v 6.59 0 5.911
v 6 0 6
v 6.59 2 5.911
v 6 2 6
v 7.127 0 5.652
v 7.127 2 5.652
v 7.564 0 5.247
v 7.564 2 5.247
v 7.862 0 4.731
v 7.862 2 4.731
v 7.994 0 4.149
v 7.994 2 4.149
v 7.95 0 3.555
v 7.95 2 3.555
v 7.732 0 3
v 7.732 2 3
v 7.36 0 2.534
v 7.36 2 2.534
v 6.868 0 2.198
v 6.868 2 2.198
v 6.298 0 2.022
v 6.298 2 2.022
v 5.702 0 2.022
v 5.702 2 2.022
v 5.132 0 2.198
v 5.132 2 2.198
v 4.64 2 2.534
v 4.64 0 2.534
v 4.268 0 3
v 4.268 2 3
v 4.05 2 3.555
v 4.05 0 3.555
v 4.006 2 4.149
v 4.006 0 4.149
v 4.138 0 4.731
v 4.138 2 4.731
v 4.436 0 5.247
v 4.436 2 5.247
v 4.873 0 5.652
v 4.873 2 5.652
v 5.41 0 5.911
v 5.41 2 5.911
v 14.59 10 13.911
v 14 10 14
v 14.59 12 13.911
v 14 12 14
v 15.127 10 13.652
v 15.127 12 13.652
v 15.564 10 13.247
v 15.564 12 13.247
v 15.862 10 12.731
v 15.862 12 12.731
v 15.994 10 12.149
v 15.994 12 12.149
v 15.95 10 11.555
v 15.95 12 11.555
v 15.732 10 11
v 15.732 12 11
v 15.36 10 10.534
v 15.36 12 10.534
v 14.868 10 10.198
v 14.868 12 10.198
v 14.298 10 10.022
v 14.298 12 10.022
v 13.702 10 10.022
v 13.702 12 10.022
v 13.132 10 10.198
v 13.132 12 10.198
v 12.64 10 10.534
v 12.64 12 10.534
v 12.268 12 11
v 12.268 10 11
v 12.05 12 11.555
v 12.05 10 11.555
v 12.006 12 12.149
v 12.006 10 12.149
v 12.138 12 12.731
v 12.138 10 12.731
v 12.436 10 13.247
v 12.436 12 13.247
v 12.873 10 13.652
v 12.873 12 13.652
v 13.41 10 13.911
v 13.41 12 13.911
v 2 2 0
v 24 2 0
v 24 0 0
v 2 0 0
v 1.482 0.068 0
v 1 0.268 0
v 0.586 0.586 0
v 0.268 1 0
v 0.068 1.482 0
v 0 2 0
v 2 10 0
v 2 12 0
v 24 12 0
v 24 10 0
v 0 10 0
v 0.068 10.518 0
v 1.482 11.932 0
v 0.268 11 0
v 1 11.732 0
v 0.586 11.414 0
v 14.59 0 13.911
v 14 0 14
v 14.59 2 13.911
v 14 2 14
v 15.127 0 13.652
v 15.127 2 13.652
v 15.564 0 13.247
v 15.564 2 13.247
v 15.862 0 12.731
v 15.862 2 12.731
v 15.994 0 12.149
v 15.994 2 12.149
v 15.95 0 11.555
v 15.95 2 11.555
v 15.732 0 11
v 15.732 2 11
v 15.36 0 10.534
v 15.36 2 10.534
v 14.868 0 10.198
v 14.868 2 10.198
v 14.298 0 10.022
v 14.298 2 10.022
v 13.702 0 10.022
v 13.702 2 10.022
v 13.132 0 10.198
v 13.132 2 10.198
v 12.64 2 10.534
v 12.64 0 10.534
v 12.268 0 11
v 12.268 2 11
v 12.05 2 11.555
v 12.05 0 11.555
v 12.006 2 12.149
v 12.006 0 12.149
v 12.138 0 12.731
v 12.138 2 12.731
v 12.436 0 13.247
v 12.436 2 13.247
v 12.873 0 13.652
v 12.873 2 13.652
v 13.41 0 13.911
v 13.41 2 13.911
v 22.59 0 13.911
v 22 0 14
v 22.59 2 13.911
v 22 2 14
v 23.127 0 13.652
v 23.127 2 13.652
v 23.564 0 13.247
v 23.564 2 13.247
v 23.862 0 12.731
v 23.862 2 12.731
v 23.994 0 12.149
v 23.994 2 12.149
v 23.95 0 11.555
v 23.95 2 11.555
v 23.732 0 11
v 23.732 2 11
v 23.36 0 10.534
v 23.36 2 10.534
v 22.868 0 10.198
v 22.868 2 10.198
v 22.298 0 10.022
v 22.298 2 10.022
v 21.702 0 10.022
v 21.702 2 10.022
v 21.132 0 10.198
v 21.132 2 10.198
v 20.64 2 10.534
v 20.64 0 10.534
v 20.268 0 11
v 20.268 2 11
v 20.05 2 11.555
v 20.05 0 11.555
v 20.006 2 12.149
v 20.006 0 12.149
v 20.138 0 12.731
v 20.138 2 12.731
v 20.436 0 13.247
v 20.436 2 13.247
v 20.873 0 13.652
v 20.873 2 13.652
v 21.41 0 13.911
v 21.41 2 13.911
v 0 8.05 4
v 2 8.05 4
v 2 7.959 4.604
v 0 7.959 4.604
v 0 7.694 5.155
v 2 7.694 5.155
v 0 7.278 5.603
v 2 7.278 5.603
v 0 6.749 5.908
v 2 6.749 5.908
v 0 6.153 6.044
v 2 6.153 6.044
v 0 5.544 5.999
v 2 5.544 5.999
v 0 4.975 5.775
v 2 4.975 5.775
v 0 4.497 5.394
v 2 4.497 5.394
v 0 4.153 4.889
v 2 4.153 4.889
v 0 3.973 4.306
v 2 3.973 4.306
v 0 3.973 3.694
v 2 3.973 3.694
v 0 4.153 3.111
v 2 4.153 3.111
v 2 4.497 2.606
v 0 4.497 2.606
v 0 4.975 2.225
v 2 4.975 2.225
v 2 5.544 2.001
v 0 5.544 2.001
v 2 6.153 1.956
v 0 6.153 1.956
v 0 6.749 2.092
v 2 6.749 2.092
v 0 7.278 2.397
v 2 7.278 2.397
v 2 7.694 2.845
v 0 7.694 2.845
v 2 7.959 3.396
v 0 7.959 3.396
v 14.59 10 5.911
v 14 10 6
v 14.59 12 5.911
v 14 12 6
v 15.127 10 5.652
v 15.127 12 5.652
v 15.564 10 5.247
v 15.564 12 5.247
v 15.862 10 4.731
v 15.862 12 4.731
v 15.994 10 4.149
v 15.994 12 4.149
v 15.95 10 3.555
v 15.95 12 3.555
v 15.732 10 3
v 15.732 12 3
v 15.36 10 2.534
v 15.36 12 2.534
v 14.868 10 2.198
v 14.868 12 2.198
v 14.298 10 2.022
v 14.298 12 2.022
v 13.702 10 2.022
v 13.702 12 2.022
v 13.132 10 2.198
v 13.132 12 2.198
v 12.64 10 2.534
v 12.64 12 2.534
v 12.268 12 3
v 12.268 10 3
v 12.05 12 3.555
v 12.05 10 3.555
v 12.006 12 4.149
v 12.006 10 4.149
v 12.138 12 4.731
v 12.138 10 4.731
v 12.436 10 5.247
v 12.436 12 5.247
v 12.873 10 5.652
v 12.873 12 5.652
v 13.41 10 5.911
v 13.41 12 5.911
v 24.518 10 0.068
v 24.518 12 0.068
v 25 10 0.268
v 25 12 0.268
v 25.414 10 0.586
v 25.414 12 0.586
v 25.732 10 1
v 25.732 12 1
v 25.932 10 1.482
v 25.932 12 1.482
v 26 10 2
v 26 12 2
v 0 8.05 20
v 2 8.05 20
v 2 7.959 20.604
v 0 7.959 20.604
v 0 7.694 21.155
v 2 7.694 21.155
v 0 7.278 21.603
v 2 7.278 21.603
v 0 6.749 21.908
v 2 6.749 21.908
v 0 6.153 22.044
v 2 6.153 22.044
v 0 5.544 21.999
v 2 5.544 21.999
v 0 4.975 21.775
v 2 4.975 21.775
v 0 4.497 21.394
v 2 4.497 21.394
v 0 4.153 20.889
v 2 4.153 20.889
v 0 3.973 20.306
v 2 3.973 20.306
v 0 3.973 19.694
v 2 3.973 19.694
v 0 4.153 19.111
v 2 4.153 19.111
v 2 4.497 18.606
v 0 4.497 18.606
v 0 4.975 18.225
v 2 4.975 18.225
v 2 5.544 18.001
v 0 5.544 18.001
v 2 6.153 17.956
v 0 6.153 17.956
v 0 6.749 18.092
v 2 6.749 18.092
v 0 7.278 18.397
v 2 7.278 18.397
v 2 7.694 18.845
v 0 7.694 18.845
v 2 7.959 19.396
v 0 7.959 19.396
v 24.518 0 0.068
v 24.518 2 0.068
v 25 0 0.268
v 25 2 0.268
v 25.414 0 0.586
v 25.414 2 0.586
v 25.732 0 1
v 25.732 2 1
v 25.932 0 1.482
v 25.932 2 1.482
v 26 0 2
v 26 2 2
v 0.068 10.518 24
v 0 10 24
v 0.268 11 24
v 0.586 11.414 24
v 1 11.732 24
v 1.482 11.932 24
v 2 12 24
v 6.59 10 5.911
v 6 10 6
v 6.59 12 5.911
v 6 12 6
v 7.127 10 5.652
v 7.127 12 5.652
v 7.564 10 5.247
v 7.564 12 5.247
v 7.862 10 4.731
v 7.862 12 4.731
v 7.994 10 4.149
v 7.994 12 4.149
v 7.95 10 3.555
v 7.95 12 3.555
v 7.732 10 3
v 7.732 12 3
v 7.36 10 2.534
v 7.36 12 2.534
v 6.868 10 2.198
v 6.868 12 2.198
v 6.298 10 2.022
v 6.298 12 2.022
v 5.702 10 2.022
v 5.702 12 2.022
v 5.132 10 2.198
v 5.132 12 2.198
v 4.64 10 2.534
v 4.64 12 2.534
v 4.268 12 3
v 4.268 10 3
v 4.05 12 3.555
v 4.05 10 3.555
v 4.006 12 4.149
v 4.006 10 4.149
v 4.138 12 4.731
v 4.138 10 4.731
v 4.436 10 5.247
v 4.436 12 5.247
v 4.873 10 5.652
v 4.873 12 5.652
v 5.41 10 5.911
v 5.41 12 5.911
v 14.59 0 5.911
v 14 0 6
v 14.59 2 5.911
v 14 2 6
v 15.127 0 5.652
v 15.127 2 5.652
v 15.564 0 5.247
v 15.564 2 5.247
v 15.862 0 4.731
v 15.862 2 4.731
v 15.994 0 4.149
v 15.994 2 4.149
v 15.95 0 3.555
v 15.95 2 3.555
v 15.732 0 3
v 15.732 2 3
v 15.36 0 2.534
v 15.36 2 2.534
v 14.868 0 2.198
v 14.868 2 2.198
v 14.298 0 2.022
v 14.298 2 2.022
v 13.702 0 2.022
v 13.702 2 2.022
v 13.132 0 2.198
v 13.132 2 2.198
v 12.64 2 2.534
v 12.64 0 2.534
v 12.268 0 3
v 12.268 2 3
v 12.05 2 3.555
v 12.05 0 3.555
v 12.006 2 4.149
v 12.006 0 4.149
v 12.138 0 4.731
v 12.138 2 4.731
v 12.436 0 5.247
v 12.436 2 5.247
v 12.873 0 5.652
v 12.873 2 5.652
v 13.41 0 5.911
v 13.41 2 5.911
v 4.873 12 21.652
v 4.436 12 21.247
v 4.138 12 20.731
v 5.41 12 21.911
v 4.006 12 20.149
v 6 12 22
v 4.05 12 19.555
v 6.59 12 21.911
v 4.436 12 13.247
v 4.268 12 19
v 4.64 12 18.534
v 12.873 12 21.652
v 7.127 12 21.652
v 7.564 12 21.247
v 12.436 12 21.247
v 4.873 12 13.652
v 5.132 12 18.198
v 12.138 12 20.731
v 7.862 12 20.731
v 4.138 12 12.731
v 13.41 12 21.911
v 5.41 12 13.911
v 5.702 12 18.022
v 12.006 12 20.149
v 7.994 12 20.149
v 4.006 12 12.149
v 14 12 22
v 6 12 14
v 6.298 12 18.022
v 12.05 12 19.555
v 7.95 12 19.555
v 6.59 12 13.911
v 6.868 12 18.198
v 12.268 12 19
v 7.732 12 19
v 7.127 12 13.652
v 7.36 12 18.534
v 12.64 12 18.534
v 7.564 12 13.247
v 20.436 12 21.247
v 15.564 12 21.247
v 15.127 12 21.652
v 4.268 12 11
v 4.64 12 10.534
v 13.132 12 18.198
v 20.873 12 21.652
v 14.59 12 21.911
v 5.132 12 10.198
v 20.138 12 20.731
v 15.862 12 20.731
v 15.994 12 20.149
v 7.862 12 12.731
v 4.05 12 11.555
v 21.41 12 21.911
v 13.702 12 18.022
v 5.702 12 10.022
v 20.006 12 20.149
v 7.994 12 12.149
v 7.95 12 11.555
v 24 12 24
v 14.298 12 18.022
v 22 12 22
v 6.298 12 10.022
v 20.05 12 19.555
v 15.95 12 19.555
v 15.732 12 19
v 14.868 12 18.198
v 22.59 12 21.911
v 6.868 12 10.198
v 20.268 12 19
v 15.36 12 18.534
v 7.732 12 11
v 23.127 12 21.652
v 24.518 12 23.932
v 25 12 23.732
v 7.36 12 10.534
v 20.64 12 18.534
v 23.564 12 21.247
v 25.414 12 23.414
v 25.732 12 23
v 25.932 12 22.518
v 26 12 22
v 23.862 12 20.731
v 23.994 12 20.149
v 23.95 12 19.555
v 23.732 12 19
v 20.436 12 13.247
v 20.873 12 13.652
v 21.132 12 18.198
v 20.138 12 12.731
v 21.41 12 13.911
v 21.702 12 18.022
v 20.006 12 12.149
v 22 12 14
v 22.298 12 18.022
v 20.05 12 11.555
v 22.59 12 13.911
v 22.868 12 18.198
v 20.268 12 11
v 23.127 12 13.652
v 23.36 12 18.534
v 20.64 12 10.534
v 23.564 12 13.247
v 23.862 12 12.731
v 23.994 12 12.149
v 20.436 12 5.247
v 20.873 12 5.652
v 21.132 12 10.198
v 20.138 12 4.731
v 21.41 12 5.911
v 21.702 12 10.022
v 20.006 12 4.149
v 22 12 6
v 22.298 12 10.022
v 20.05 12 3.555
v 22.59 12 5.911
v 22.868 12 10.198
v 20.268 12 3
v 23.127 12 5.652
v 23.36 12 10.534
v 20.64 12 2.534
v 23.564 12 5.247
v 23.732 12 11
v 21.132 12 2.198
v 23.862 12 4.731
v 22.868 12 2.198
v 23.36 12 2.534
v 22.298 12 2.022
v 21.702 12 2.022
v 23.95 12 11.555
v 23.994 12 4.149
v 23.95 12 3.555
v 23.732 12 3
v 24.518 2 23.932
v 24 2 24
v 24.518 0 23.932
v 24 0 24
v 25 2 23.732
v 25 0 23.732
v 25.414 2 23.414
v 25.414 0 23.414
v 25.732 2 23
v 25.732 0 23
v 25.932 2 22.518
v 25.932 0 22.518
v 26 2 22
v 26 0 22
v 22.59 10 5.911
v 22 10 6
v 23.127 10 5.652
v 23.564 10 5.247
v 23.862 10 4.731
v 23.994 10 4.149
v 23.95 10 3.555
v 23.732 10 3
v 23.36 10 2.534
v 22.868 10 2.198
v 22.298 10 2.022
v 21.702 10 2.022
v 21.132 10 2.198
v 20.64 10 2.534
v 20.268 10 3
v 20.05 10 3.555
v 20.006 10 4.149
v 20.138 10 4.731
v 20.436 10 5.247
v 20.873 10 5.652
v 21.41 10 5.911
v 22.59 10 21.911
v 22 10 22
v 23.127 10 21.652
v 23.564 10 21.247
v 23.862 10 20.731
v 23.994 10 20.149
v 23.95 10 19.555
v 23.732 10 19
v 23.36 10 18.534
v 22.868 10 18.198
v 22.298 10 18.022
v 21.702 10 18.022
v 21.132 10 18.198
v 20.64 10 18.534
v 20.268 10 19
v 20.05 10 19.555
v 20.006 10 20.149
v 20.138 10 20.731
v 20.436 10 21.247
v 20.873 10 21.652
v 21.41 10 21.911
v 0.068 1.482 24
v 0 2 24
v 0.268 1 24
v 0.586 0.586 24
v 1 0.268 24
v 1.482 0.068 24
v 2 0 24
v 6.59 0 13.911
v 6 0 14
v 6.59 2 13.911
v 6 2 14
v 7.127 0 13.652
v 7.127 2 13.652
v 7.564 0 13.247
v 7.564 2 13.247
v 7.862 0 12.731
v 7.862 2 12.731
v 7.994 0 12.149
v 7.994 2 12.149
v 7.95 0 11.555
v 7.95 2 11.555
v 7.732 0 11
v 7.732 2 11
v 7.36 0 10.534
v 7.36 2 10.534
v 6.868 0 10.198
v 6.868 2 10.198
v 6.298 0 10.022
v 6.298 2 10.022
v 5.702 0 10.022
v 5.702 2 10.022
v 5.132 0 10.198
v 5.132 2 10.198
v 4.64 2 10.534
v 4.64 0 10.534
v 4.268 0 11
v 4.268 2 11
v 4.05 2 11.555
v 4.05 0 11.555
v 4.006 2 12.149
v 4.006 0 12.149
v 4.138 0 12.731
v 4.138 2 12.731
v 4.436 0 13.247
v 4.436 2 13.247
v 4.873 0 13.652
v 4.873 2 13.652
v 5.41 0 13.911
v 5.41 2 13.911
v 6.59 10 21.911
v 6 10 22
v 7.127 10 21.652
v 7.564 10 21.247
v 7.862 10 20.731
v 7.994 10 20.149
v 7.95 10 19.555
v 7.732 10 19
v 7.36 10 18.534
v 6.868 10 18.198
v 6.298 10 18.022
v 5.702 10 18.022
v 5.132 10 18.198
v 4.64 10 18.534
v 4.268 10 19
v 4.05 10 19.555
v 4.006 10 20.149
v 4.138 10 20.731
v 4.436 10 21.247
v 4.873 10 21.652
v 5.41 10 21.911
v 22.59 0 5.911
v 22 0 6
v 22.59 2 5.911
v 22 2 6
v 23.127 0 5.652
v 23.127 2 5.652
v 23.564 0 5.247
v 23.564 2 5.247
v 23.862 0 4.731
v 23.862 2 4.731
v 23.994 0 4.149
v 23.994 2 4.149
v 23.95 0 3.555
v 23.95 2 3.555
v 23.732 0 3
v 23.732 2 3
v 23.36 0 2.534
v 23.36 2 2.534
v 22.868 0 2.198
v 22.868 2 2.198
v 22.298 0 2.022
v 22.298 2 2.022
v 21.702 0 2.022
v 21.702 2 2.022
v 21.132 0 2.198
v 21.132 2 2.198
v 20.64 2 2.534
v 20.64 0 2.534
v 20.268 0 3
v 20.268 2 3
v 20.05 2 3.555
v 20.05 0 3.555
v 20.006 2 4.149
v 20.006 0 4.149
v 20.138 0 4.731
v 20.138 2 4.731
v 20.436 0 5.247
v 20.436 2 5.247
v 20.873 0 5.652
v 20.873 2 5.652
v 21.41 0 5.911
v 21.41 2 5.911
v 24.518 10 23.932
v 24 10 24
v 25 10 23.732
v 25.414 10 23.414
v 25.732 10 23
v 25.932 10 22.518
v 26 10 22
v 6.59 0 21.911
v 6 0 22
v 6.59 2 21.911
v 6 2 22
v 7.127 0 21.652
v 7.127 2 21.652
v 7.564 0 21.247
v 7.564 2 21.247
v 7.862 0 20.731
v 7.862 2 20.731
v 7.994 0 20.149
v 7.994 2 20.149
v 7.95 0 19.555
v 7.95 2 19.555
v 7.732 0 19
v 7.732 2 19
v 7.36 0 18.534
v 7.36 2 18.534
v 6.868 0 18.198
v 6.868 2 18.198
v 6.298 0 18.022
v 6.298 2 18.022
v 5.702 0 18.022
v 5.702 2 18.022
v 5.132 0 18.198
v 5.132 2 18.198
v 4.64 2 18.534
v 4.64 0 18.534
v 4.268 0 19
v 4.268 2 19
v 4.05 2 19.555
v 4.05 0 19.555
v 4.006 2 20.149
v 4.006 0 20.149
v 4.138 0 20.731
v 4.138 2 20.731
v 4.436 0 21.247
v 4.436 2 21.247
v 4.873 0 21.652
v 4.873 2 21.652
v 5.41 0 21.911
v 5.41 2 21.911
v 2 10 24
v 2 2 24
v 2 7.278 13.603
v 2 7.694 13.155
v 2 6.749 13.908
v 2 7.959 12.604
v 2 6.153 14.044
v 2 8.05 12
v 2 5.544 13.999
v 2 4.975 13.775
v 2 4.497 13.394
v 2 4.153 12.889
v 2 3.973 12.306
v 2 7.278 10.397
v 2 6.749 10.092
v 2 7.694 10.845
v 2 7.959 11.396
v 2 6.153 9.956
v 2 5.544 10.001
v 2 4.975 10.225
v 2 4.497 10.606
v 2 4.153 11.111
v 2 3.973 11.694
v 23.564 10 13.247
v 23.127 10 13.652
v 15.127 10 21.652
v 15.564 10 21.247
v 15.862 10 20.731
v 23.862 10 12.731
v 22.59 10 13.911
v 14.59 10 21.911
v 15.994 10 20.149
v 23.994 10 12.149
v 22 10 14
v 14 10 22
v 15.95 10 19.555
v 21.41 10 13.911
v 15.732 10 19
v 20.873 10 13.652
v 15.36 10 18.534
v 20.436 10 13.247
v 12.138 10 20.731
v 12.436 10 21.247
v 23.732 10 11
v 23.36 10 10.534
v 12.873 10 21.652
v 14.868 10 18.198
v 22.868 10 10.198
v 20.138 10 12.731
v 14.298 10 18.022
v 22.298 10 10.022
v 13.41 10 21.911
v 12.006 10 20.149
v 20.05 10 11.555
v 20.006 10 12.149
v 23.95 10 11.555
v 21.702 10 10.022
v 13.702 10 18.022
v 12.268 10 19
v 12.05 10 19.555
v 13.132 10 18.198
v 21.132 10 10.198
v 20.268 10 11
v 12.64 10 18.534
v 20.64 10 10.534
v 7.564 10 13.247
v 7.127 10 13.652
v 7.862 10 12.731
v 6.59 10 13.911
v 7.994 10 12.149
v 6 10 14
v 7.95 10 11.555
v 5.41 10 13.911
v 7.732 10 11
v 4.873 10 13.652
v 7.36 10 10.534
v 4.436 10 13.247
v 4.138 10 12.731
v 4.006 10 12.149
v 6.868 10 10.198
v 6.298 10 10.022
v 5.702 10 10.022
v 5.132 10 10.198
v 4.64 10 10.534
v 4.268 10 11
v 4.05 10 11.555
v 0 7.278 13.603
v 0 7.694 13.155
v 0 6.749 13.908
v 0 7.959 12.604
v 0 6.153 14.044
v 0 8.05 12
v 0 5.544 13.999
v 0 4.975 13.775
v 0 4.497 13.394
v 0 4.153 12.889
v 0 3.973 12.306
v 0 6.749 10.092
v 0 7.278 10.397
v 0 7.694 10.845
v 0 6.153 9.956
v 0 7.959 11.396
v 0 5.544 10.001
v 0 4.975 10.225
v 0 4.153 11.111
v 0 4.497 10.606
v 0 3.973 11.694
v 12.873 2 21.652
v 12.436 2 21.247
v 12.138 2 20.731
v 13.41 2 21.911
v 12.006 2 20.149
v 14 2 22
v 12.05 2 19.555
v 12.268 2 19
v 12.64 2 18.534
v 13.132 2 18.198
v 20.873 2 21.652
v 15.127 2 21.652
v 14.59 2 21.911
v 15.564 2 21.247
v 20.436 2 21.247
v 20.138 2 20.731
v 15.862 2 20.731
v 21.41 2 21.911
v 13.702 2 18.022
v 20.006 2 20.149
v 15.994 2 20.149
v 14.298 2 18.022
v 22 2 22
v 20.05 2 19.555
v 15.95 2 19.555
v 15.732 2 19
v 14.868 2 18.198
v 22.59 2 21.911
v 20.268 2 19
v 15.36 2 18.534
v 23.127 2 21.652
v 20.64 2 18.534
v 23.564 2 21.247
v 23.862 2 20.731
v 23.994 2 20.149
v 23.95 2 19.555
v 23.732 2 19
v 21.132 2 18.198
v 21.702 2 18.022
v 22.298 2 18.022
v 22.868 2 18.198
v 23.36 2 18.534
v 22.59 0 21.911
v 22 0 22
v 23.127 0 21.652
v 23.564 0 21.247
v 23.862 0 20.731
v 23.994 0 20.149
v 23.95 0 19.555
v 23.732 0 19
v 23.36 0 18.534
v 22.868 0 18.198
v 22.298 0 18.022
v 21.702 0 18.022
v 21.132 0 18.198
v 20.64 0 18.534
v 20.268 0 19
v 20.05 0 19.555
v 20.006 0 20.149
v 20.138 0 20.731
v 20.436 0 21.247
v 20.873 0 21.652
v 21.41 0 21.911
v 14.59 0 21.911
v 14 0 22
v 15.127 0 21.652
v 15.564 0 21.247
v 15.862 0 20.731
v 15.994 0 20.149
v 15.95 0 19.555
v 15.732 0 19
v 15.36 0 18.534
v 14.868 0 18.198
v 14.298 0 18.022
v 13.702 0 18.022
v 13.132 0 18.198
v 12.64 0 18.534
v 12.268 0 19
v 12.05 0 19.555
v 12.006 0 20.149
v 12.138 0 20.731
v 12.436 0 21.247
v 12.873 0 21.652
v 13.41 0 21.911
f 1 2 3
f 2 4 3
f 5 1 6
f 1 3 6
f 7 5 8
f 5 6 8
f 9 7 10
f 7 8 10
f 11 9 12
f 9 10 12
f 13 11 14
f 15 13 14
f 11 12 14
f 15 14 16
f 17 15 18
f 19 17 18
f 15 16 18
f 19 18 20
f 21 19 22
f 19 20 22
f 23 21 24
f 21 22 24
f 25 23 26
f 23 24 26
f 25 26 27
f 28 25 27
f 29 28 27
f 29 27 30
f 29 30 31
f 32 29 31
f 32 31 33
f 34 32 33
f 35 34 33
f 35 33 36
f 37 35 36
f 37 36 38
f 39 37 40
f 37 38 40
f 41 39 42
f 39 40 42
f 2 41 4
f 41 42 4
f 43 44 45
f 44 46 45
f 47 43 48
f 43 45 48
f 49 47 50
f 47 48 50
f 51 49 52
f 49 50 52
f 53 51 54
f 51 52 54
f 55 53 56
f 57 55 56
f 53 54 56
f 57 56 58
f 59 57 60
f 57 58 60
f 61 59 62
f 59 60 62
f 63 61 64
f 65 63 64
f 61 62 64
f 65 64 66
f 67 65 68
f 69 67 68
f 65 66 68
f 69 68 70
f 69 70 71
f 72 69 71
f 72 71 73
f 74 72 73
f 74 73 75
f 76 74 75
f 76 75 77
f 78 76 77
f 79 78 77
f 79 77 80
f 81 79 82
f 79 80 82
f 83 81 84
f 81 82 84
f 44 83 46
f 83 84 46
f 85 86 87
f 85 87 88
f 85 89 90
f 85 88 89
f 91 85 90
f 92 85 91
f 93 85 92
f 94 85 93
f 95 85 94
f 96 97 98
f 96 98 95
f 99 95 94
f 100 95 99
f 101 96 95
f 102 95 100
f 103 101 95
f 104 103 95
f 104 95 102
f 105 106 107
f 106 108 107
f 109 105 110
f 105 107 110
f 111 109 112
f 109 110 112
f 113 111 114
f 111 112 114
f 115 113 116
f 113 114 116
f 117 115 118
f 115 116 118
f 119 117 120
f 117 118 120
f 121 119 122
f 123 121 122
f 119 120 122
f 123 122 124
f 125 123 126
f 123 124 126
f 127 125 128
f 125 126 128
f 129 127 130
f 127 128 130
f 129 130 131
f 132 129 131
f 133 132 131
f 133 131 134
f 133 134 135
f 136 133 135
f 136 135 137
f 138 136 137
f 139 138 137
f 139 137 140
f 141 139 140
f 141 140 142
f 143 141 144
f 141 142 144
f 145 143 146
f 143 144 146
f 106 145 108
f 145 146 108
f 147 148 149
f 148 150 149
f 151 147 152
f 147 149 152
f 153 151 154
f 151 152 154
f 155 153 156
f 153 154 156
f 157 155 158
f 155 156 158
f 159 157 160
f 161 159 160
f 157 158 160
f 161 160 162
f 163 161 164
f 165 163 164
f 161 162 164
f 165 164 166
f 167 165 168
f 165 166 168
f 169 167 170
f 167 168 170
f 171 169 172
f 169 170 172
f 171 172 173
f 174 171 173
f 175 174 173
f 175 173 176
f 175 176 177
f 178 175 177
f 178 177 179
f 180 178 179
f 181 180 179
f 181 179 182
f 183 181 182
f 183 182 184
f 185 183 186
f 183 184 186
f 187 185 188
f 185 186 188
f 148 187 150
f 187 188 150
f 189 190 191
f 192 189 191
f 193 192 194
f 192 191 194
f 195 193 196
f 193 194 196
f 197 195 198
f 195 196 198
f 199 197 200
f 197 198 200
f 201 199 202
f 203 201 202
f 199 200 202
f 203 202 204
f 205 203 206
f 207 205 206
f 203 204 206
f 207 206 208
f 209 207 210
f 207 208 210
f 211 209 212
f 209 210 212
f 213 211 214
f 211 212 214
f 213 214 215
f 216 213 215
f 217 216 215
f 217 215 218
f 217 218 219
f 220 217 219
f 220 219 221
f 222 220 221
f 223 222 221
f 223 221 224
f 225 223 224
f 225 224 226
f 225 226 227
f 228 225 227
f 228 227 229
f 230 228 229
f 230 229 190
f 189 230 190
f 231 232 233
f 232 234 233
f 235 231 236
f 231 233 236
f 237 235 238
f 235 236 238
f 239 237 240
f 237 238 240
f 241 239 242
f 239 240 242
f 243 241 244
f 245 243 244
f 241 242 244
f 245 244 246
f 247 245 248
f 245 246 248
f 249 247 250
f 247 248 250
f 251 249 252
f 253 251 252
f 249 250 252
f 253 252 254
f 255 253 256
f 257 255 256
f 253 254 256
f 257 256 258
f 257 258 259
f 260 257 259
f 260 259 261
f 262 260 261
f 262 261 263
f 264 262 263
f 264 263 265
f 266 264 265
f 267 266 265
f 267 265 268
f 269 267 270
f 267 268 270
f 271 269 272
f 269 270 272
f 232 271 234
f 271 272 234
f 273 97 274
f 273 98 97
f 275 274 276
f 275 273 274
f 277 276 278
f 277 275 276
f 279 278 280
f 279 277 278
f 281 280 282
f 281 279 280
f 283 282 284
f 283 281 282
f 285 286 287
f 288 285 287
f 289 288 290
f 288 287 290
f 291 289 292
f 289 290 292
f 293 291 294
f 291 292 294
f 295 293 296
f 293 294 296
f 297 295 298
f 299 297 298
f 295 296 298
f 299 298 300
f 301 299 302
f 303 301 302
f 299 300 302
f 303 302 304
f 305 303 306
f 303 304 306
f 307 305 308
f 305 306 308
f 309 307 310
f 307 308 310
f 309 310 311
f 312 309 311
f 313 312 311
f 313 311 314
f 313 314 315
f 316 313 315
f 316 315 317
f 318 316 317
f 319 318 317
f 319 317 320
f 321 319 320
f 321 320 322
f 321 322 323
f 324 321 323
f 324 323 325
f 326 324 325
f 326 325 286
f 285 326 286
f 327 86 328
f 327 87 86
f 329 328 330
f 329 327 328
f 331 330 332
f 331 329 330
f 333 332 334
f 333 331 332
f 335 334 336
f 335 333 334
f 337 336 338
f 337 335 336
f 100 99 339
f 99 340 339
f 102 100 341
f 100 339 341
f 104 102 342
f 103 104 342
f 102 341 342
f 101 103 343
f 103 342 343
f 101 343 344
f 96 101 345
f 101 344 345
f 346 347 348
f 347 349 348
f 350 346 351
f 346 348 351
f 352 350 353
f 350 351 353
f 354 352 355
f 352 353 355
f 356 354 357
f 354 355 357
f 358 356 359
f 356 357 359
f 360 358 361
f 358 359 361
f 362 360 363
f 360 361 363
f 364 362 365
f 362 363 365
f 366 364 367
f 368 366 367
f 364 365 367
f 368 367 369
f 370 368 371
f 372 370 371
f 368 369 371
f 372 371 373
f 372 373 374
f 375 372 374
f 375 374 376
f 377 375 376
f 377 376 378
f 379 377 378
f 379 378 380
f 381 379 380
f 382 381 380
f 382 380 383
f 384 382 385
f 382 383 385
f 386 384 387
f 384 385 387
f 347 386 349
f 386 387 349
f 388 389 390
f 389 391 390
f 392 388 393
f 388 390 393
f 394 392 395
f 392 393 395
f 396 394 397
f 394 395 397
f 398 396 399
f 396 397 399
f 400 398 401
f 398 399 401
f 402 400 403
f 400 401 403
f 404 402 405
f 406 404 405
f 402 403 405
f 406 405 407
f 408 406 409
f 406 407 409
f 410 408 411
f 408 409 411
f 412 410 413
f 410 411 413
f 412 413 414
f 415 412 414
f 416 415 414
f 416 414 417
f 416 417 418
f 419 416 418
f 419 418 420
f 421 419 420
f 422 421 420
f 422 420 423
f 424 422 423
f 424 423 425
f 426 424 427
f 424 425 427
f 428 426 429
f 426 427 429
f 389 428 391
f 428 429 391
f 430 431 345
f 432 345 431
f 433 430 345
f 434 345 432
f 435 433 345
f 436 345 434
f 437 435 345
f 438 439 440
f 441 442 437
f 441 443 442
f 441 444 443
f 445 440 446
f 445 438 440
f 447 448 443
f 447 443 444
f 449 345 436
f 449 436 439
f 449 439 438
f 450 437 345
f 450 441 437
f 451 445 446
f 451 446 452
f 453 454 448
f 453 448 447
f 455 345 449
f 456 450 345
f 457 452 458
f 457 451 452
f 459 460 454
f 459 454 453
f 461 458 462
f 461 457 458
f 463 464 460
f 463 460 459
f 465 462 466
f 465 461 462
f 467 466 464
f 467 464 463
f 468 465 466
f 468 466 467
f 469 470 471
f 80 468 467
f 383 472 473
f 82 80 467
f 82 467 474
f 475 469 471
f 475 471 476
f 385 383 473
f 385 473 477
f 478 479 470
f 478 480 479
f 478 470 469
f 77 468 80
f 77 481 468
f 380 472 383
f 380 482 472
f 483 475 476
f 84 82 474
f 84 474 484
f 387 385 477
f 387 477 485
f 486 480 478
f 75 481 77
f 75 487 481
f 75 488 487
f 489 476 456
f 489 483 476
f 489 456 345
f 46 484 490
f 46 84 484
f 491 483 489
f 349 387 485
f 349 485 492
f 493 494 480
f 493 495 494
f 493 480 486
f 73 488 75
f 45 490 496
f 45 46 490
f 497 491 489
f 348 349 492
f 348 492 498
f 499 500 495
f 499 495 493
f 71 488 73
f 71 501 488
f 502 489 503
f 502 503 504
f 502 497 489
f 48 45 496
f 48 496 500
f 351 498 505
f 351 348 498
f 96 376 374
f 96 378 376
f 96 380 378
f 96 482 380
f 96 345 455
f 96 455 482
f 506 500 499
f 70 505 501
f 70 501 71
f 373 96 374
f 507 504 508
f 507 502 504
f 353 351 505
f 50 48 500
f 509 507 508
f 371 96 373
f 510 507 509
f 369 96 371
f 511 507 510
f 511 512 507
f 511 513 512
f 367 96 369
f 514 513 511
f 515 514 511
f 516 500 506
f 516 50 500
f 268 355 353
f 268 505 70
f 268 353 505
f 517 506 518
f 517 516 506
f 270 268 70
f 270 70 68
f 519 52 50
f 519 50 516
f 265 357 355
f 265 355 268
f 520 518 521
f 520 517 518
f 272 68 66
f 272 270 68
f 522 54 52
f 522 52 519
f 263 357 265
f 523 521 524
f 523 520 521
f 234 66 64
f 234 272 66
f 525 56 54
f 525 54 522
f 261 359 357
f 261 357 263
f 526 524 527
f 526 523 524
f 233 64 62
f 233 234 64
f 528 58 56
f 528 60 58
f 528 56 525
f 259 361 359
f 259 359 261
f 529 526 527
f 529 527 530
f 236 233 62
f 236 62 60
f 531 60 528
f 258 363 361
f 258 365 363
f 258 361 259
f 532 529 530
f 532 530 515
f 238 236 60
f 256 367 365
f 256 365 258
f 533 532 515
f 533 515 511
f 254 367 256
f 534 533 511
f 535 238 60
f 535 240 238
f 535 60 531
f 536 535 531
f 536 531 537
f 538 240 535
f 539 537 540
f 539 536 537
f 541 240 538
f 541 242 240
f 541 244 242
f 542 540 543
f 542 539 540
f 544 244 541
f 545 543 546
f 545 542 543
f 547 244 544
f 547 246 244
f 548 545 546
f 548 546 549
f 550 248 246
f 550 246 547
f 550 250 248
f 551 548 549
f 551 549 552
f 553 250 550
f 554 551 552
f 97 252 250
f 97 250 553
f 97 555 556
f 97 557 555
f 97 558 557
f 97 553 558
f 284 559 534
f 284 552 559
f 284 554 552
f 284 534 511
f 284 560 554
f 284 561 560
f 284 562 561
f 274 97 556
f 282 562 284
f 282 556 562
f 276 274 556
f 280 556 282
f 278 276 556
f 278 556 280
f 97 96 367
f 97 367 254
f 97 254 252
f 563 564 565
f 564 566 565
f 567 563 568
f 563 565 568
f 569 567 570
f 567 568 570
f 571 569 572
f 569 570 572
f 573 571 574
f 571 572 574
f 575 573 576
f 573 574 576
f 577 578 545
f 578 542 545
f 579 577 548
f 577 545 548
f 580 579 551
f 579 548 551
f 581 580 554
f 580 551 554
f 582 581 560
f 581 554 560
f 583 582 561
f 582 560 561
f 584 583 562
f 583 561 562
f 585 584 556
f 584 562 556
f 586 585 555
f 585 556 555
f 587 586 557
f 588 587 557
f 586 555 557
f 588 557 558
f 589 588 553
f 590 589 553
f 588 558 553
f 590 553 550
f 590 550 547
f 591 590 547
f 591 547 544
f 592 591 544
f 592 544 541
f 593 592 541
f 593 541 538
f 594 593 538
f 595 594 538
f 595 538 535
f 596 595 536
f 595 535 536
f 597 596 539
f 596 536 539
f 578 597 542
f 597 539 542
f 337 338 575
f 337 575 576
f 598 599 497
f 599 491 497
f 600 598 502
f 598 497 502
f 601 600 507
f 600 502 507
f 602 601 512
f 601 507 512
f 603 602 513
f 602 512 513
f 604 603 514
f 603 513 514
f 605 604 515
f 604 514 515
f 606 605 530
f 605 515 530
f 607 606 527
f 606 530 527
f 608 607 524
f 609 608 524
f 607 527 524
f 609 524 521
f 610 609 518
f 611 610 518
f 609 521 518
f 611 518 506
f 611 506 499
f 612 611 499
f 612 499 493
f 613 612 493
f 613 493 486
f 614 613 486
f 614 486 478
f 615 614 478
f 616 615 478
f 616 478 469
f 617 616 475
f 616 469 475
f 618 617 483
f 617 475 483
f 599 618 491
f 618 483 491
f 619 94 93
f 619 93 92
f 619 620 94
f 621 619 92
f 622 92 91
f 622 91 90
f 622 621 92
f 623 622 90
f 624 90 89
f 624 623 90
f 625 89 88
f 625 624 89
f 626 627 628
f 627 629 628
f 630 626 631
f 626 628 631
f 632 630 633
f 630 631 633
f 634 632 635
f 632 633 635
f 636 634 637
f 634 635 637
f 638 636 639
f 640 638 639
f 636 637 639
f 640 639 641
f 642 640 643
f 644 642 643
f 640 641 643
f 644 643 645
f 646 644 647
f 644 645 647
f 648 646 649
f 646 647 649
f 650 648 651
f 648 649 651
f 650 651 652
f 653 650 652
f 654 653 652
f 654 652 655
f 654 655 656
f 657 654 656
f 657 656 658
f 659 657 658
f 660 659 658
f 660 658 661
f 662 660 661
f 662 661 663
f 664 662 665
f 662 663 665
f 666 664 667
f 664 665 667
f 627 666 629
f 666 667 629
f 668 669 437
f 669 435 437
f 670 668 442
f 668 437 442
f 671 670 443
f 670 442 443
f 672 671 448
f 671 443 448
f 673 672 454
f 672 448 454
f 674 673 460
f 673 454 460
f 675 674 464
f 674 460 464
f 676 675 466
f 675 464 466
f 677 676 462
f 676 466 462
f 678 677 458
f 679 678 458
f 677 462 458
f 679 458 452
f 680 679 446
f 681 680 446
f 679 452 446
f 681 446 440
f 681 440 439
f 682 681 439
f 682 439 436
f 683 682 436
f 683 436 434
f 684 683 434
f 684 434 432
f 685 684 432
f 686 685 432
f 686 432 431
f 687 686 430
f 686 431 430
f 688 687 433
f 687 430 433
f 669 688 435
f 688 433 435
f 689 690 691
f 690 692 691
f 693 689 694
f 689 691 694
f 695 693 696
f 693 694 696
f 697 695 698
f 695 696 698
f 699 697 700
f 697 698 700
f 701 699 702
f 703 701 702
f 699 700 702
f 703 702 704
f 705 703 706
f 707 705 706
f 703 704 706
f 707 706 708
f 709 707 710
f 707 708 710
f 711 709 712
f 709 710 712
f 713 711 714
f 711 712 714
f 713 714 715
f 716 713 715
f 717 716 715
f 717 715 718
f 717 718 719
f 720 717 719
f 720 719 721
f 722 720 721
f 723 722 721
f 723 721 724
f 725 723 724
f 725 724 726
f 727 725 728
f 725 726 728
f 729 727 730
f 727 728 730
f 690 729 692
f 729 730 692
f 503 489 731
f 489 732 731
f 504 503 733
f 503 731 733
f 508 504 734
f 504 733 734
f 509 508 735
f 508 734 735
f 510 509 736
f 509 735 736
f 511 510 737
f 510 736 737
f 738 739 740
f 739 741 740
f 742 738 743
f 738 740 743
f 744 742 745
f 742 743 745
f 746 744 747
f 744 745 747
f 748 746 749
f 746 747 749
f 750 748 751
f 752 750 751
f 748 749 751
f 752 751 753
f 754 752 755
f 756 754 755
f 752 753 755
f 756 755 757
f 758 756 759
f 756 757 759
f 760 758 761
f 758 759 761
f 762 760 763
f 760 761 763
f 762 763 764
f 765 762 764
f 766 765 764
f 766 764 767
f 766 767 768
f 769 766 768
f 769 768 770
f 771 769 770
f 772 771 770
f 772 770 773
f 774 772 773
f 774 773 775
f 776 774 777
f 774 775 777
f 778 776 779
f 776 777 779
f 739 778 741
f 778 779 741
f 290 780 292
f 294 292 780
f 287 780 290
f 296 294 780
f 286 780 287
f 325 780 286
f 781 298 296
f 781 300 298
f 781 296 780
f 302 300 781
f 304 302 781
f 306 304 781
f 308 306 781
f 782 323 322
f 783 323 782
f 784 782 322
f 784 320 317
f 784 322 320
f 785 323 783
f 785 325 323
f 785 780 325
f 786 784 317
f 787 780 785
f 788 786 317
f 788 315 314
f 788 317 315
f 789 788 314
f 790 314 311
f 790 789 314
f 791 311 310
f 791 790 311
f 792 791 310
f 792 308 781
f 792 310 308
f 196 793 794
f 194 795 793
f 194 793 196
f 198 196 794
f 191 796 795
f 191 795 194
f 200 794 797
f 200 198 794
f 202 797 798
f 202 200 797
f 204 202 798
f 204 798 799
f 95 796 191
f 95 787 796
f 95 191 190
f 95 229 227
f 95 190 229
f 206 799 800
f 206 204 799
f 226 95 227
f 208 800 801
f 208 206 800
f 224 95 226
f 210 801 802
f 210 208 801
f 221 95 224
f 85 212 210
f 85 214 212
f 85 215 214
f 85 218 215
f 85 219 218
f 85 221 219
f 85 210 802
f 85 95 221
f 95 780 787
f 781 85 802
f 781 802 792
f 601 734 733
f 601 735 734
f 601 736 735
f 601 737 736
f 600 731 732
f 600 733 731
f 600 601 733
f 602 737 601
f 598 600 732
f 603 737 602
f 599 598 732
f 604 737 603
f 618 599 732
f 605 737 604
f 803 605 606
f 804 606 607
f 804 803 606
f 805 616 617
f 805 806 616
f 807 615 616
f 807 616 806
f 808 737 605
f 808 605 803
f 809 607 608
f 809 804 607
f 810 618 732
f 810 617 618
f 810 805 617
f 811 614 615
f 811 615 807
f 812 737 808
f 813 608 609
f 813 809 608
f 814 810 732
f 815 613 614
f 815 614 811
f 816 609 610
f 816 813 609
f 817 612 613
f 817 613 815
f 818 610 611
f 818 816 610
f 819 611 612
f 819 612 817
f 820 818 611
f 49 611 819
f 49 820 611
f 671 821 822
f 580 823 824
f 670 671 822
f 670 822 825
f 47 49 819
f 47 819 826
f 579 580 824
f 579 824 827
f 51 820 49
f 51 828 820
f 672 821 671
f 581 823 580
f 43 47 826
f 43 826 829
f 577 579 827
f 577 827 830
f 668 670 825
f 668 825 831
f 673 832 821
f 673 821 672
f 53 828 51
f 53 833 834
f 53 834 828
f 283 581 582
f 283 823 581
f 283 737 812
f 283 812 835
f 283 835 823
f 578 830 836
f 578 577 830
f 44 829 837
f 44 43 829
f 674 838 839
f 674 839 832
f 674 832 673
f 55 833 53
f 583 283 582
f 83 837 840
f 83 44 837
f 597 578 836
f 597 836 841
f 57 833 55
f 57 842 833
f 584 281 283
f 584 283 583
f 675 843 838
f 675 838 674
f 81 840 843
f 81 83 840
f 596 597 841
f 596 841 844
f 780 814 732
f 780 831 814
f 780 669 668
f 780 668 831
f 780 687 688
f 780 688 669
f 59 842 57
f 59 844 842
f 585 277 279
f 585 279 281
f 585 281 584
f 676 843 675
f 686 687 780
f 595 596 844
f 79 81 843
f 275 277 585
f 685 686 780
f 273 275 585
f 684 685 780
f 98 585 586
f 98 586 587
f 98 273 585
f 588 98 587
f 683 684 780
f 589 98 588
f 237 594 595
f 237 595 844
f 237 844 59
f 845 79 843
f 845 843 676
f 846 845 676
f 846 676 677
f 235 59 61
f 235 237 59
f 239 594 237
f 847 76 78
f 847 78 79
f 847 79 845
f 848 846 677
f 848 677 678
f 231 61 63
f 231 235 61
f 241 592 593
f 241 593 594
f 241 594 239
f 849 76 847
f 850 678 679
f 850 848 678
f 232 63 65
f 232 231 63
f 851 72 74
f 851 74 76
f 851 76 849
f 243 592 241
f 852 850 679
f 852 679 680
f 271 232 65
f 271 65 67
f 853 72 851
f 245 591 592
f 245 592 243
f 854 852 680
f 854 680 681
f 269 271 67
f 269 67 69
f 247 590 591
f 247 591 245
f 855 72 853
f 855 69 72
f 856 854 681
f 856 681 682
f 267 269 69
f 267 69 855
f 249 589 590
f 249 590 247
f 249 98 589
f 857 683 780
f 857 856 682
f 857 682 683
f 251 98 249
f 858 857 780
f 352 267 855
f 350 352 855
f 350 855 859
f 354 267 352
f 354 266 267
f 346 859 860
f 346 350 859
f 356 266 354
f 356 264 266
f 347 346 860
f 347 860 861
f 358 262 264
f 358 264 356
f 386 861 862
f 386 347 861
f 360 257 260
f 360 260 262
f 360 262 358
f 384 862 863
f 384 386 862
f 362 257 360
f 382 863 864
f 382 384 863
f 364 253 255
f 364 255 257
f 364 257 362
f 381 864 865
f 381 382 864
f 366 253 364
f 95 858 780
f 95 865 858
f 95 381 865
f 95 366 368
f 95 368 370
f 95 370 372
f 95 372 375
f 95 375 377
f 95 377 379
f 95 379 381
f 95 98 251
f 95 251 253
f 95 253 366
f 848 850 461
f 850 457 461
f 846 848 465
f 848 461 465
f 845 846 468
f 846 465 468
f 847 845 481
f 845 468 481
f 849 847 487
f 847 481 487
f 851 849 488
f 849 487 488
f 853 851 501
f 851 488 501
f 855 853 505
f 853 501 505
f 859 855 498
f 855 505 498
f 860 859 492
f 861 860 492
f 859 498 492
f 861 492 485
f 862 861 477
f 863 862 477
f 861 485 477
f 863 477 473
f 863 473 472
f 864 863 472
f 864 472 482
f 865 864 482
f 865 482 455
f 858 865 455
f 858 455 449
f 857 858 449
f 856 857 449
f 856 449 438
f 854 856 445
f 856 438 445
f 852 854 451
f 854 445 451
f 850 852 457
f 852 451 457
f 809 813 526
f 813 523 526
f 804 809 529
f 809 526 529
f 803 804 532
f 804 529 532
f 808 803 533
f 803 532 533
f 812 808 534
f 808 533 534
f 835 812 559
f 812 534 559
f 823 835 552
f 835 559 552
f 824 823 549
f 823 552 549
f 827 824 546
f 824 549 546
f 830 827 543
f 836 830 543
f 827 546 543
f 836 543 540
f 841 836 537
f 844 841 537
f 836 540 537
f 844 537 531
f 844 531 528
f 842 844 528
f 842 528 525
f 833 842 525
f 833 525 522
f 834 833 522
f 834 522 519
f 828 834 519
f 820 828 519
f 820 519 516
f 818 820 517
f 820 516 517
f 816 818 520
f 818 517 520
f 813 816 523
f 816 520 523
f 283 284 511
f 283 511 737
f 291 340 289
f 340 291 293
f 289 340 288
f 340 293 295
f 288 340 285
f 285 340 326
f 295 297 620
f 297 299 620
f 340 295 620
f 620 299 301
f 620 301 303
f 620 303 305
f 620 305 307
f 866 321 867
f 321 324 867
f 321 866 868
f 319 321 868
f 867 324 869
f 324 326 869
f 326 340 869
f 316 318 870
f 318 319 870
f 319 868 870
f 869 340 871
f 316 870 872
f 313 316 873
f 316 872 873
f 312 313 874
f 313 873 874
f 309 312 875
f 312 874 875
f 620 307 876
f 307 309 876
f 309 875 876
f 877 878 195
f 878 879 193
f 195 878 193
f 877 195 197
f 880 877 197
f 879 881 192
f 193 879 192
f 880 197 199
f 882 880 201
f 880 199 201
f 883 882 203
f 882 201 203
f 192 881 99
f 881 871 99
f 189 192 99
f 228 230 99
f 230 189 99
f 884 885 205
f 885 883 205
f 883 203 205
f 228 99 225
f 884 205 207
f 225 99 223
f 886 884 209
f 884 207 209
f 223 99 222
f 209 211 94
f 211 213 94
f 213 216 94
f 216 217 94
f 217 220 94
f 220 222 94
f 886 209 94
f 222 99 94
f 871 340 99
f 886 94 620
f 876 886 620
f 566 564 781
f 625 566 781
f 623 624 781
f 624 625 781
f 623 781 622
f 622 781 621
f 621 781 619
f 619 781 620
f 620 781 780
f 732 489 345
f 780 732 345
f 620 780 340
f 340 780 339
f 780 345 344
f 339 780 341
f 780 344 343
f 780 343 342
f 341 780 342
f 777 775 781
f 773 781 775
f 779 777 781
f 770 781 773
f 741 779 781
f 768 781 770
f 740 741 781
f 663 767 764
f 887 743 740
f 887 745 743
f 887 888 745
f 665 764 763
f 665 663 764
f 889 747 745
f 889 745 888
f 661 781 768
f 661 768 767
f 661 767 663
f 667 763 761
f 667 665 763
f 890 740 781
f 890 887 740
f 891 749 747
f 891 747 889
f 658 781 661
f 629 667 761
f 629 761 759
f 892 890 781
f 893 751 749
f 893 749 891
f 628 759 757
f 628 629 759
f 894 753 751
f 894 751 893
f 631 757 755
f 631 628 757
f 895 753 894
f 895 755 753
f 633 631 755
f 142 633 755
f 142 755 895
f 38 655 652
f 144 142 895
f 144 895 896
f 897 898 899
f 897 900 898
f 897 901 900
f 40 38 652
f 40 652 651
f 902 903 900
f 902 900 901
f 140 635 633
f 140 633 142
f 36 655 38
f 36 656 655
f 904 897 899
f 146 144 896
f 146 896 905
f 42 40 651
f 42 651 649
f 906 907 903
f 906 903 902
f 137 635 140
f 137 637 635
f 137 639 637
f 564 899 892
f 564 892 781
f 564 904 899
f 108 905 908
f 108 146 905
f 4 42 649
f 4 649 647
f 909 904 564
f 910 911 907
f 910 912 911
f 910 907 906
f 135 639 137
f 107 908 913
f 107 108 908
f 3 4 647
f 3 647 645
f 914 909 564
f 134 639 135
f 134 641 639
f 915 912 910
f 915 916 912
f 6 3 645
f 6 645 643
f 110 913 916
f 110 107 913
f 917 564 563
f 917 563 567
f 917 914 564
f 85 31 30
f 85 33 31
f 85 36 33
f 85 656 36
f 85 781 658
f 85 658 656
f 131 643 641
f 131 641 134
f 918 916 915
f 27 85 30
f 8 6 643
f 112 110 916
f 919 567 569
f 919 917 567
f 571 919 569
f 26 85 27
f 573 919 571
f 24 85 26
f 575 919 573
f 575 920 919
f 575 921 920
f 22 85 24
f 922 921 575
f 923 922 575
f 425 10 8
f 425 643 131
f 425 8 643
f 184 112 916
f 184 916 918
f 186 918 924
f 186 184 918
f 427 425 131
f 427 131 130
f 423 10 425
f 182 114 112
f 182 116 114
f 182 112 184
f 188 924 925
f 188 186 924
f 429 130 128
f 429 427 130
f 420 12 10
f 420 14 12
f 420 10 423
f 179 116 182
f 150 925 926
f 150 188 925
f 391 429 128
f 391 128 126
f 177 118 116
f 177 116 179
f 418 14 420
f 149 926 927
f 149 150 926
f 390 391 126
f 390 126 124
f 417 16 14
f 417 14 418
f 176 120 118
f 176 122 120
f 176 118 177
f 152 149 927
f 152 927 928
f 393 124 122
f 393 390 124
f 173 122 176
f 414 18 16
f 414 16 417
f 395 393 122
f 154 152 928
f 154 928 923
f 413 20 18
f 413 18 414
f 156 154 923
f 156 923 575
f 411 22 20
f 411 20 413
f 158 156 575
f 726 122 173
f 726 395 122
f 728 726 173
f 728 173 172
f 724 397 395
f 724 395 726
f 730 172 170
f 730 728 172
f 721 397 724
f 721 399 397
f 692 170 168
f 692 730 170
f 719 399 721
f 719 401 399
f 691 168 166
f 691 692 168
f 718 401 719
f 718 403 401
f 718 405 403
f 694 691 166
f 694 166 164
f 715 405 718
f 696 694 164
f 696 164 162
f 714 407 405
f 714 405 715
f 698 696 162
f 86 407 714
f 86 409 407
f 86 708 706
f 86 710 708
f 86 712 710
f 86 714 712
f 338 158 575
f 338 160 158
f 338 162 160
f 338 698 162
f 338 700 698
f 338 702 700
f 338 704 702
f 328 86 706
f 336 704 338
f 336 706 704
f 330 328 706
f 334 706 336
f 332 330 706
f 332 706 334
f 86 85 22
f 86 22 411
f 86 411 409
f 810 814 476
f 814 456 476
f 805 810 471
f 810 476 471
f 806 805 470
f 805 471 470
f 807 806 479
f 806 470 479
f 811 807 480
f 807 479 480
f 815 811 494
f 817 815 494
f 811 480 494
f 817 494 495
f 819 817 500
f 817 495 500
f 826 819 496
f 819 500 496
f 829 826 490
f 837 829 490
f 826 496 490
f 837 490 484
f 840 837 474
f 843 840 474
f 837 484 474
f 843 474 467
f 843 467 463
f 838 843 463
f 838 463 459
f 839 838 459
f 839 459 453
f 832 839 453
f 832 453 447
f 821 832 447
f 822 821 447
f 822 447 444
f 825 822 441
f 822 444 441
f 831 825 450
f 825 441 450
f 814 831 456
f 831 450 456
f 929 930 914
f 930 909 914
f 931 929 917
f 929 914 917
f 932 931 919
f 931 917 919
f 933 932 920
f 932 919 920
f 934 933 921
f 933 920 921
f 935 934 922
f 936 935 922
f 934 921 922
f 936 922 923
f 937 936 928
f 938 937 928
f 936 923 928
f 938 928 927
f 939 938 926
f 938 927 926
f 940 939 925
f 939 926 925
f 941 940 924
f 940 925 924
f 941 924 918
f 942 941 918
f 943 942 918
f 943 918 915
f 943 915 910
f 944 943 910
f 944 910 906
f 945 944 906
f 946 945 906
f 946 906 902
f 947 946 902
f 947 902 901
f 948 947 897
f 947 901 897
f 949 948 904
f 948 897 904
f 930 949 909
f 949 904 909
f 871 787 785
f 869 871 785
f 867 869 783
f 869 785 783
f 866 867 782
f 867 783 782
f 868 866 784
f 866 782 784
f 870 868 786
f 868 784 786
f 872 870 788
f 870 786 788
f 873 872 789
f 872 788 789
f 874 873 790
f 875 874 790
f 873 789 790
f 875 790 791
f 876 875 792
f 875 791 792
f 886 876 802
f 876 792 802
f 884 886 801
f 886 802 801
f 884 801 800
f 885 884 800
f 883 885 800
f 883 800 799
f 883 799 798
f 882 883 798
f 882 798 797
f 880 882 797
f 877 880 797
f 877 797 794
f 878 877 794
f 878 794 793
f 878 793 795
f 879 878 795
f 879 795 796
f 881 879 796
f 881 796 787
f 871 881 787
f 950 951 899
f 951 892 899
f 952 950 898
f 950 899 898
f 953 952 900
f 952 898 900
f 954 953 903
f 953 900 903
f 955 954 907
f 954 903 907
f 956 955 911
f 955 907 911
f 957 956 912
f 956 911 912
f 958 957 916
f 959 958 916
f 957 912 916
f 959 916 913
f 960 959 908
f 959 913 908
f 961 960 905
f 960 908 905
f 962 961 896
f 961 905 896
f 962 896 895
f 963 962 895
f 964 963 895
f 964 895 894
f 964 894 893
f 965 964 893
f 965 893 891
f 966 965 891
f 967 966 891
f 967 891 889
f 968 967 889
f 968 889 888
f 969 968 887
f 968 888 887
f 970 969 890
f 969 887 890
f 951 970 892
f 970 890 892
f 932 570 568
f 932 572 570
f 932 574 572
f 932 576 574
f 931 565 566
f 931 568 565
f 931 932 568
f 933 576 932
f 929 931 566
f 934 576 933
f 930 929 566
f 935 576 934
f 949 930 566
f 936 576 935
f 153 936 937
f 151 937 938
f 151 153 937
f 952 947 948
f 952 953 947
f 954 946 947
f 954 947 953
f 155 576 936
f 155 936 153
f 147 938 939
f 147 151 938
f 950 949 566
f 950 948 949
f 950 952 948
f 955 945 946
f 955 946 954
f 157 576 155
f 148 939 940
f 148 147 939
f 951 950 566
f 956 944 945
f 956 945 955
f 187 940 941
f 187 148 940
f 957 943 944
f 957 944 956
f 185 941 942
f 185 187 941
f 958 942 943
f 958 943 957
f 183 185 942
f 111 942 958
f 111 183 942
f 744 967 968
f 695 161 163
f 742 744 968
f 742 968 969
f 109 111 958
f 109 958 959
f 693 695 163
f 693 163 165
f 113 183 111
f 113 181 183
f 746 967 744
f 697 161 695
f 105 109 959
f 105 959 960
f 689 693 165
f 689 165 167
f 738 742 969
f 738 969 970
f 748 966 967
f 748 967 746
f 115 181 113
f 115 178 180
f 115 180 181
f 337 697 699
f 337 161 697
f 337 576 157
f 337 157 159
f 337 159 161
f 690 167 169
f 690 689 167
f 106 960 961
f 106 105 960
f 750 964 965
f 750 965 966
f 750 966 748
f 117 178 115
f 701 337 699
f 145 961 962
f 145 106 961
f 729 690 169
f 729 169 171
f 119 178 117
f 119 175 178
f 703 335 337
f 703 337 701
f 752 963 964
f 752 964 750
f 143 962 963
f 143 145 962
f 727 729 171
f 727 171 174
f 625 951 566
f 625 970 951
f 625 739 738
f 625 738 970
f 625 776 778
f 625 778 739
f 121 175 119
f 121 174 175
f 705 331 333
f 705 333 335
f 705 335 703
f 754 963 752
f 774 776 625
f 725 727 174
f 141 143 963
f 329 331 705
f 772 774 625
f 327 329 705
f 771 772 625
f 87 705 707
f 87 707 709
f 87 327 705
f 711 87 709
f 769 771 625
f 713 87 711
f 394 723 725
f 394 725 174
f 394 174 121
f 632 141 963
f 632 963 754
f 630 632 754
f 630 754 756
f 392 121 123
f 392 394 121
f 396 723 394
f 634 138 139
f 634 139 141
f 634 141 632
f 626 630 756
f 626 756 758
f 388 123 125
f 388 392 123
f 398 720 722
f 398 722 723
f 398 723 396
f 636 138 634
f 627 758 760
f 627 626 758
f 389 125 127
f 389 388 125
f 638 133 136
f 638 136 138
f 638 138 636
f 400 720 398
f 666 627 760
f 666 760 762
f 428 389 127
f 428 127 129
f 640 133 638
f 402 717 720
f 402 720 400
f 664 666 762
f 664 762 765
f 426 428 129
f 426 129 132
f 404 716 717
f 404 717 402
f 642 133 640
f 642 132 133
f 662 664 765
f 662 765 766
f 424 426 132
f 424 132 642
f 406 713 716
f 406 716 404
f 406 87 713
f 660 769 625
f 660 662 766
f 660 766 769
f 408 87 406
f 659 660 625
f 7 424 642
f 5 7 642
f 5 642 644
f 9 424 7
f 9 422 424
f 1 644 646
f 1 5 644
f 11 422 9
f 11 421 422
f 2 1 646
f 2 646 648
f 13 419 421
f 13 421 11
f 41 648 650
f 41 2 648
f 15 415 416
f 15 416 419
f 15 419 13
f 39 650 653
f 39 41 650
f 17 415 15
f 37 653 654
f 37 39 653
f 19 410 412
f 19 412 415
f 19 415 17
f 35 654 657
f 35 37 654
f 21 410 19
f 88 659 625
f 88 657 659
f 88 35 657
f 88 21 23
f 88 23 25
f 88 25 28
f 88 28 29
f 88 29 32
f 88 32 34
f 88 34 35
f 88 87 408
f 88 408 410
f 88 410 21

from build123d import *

# Parameters (mm, degrees)
BOSS_EXTRUDE1_DEPTH  = 24
SKETCH2_R            = 2.05
CUT_EXTRUDE1_DEPTH   = 37
LPATTERN1_COUNT      = 3
LPATTERN1_PITCH      = 8
SKETCH3_R            = 2
CUT_EXTRUDE2_DEPTH   = 37.769552622
LPATTERN2_COUNT      = 3
LPATTERN2_PITCH      = 8
LPATTERN2_COUNT_DIR2 = 3
LPATTERN2_PITCH_DIR2 = 8
FILLET1_R            = 2


with BuildPart() as part:
    # Sketch1 → Boss-Extrude1 (new body)
    with BuildSketch(Plane.XY):
        Polygon((0, 0), (0, 10), (0, 12), (26, 12), (26, 10), (2, 10), (2, 2), (26, 2), (26, 0), align=None)
    extrude(amount=BOSS_EXTRUDE1_DEPTH)

    # Sketch2 → Cut-Extrude1 (cut, through all)
    with BuildSketch(Plane(origin=(2, 0, 0), x_dir=(0, 0, -1), z_dir=(1, 0, 0))):
        with Locations(Location((-20, 6, 0), (0, 0, 90))):
            Circle(SKETCH2_R)
    cut_extrude1 = extrude(amount=-CUT_EXTRUDE1_DEPTH, mode=Mode.SUBTRACT)

    # LPattern1: Cut-Extrude1 ×3
    with Locations(*[(0, 0, -i * LPATTERN1_PITCH) for i in range(1, LPATTERN1_COUNT)]):
        add(cut_extrude1, mode=Mode.SUBTRACT)

    # Sketch3 → Cut-Extrude2 (cut, symmetric)
    with BuildSketch(Plane(origin=(0, 2, 0), x_dir=(1, 0, 0), z_dir=(0, 1, 0))):
        with Locations(Location((22, -4, 0), (0, 0, 270))):
            Circle(SKETCH3_R)
    cut_extrude2 = extrude(amount=CUT_EXTRUDE2_DEPTH, both=True, mode=Mode.SUBTRACT)

    # LPattern2: Cut-Extrude2 3 × 3
    with Locations(*[(-j * LPATTERN2_PITCH_DIR2, 0, i * LPATTERN2_PITCH) for i in range(LPATTERN2_COUNT) for j in range(LPATTERN2_COUNT_DIR2) if (i, j) != (0, 0)]):
        add(cut_extrude2, mode=Mode.SUBTRACT)

    # Fillet1
    fillet1_edges = [part.edges().sort_by_distance(p)[0] for p in [
        (26, 1, 0),
        (0, 0, 12),
        (0, 12, 12),
        (26, 11, 24),
        (26, 1, 24),
        (26, 11, 0),
    ]]
    fillet(fillet1_edges, radius=FILLET1_R)


solid = part.part
